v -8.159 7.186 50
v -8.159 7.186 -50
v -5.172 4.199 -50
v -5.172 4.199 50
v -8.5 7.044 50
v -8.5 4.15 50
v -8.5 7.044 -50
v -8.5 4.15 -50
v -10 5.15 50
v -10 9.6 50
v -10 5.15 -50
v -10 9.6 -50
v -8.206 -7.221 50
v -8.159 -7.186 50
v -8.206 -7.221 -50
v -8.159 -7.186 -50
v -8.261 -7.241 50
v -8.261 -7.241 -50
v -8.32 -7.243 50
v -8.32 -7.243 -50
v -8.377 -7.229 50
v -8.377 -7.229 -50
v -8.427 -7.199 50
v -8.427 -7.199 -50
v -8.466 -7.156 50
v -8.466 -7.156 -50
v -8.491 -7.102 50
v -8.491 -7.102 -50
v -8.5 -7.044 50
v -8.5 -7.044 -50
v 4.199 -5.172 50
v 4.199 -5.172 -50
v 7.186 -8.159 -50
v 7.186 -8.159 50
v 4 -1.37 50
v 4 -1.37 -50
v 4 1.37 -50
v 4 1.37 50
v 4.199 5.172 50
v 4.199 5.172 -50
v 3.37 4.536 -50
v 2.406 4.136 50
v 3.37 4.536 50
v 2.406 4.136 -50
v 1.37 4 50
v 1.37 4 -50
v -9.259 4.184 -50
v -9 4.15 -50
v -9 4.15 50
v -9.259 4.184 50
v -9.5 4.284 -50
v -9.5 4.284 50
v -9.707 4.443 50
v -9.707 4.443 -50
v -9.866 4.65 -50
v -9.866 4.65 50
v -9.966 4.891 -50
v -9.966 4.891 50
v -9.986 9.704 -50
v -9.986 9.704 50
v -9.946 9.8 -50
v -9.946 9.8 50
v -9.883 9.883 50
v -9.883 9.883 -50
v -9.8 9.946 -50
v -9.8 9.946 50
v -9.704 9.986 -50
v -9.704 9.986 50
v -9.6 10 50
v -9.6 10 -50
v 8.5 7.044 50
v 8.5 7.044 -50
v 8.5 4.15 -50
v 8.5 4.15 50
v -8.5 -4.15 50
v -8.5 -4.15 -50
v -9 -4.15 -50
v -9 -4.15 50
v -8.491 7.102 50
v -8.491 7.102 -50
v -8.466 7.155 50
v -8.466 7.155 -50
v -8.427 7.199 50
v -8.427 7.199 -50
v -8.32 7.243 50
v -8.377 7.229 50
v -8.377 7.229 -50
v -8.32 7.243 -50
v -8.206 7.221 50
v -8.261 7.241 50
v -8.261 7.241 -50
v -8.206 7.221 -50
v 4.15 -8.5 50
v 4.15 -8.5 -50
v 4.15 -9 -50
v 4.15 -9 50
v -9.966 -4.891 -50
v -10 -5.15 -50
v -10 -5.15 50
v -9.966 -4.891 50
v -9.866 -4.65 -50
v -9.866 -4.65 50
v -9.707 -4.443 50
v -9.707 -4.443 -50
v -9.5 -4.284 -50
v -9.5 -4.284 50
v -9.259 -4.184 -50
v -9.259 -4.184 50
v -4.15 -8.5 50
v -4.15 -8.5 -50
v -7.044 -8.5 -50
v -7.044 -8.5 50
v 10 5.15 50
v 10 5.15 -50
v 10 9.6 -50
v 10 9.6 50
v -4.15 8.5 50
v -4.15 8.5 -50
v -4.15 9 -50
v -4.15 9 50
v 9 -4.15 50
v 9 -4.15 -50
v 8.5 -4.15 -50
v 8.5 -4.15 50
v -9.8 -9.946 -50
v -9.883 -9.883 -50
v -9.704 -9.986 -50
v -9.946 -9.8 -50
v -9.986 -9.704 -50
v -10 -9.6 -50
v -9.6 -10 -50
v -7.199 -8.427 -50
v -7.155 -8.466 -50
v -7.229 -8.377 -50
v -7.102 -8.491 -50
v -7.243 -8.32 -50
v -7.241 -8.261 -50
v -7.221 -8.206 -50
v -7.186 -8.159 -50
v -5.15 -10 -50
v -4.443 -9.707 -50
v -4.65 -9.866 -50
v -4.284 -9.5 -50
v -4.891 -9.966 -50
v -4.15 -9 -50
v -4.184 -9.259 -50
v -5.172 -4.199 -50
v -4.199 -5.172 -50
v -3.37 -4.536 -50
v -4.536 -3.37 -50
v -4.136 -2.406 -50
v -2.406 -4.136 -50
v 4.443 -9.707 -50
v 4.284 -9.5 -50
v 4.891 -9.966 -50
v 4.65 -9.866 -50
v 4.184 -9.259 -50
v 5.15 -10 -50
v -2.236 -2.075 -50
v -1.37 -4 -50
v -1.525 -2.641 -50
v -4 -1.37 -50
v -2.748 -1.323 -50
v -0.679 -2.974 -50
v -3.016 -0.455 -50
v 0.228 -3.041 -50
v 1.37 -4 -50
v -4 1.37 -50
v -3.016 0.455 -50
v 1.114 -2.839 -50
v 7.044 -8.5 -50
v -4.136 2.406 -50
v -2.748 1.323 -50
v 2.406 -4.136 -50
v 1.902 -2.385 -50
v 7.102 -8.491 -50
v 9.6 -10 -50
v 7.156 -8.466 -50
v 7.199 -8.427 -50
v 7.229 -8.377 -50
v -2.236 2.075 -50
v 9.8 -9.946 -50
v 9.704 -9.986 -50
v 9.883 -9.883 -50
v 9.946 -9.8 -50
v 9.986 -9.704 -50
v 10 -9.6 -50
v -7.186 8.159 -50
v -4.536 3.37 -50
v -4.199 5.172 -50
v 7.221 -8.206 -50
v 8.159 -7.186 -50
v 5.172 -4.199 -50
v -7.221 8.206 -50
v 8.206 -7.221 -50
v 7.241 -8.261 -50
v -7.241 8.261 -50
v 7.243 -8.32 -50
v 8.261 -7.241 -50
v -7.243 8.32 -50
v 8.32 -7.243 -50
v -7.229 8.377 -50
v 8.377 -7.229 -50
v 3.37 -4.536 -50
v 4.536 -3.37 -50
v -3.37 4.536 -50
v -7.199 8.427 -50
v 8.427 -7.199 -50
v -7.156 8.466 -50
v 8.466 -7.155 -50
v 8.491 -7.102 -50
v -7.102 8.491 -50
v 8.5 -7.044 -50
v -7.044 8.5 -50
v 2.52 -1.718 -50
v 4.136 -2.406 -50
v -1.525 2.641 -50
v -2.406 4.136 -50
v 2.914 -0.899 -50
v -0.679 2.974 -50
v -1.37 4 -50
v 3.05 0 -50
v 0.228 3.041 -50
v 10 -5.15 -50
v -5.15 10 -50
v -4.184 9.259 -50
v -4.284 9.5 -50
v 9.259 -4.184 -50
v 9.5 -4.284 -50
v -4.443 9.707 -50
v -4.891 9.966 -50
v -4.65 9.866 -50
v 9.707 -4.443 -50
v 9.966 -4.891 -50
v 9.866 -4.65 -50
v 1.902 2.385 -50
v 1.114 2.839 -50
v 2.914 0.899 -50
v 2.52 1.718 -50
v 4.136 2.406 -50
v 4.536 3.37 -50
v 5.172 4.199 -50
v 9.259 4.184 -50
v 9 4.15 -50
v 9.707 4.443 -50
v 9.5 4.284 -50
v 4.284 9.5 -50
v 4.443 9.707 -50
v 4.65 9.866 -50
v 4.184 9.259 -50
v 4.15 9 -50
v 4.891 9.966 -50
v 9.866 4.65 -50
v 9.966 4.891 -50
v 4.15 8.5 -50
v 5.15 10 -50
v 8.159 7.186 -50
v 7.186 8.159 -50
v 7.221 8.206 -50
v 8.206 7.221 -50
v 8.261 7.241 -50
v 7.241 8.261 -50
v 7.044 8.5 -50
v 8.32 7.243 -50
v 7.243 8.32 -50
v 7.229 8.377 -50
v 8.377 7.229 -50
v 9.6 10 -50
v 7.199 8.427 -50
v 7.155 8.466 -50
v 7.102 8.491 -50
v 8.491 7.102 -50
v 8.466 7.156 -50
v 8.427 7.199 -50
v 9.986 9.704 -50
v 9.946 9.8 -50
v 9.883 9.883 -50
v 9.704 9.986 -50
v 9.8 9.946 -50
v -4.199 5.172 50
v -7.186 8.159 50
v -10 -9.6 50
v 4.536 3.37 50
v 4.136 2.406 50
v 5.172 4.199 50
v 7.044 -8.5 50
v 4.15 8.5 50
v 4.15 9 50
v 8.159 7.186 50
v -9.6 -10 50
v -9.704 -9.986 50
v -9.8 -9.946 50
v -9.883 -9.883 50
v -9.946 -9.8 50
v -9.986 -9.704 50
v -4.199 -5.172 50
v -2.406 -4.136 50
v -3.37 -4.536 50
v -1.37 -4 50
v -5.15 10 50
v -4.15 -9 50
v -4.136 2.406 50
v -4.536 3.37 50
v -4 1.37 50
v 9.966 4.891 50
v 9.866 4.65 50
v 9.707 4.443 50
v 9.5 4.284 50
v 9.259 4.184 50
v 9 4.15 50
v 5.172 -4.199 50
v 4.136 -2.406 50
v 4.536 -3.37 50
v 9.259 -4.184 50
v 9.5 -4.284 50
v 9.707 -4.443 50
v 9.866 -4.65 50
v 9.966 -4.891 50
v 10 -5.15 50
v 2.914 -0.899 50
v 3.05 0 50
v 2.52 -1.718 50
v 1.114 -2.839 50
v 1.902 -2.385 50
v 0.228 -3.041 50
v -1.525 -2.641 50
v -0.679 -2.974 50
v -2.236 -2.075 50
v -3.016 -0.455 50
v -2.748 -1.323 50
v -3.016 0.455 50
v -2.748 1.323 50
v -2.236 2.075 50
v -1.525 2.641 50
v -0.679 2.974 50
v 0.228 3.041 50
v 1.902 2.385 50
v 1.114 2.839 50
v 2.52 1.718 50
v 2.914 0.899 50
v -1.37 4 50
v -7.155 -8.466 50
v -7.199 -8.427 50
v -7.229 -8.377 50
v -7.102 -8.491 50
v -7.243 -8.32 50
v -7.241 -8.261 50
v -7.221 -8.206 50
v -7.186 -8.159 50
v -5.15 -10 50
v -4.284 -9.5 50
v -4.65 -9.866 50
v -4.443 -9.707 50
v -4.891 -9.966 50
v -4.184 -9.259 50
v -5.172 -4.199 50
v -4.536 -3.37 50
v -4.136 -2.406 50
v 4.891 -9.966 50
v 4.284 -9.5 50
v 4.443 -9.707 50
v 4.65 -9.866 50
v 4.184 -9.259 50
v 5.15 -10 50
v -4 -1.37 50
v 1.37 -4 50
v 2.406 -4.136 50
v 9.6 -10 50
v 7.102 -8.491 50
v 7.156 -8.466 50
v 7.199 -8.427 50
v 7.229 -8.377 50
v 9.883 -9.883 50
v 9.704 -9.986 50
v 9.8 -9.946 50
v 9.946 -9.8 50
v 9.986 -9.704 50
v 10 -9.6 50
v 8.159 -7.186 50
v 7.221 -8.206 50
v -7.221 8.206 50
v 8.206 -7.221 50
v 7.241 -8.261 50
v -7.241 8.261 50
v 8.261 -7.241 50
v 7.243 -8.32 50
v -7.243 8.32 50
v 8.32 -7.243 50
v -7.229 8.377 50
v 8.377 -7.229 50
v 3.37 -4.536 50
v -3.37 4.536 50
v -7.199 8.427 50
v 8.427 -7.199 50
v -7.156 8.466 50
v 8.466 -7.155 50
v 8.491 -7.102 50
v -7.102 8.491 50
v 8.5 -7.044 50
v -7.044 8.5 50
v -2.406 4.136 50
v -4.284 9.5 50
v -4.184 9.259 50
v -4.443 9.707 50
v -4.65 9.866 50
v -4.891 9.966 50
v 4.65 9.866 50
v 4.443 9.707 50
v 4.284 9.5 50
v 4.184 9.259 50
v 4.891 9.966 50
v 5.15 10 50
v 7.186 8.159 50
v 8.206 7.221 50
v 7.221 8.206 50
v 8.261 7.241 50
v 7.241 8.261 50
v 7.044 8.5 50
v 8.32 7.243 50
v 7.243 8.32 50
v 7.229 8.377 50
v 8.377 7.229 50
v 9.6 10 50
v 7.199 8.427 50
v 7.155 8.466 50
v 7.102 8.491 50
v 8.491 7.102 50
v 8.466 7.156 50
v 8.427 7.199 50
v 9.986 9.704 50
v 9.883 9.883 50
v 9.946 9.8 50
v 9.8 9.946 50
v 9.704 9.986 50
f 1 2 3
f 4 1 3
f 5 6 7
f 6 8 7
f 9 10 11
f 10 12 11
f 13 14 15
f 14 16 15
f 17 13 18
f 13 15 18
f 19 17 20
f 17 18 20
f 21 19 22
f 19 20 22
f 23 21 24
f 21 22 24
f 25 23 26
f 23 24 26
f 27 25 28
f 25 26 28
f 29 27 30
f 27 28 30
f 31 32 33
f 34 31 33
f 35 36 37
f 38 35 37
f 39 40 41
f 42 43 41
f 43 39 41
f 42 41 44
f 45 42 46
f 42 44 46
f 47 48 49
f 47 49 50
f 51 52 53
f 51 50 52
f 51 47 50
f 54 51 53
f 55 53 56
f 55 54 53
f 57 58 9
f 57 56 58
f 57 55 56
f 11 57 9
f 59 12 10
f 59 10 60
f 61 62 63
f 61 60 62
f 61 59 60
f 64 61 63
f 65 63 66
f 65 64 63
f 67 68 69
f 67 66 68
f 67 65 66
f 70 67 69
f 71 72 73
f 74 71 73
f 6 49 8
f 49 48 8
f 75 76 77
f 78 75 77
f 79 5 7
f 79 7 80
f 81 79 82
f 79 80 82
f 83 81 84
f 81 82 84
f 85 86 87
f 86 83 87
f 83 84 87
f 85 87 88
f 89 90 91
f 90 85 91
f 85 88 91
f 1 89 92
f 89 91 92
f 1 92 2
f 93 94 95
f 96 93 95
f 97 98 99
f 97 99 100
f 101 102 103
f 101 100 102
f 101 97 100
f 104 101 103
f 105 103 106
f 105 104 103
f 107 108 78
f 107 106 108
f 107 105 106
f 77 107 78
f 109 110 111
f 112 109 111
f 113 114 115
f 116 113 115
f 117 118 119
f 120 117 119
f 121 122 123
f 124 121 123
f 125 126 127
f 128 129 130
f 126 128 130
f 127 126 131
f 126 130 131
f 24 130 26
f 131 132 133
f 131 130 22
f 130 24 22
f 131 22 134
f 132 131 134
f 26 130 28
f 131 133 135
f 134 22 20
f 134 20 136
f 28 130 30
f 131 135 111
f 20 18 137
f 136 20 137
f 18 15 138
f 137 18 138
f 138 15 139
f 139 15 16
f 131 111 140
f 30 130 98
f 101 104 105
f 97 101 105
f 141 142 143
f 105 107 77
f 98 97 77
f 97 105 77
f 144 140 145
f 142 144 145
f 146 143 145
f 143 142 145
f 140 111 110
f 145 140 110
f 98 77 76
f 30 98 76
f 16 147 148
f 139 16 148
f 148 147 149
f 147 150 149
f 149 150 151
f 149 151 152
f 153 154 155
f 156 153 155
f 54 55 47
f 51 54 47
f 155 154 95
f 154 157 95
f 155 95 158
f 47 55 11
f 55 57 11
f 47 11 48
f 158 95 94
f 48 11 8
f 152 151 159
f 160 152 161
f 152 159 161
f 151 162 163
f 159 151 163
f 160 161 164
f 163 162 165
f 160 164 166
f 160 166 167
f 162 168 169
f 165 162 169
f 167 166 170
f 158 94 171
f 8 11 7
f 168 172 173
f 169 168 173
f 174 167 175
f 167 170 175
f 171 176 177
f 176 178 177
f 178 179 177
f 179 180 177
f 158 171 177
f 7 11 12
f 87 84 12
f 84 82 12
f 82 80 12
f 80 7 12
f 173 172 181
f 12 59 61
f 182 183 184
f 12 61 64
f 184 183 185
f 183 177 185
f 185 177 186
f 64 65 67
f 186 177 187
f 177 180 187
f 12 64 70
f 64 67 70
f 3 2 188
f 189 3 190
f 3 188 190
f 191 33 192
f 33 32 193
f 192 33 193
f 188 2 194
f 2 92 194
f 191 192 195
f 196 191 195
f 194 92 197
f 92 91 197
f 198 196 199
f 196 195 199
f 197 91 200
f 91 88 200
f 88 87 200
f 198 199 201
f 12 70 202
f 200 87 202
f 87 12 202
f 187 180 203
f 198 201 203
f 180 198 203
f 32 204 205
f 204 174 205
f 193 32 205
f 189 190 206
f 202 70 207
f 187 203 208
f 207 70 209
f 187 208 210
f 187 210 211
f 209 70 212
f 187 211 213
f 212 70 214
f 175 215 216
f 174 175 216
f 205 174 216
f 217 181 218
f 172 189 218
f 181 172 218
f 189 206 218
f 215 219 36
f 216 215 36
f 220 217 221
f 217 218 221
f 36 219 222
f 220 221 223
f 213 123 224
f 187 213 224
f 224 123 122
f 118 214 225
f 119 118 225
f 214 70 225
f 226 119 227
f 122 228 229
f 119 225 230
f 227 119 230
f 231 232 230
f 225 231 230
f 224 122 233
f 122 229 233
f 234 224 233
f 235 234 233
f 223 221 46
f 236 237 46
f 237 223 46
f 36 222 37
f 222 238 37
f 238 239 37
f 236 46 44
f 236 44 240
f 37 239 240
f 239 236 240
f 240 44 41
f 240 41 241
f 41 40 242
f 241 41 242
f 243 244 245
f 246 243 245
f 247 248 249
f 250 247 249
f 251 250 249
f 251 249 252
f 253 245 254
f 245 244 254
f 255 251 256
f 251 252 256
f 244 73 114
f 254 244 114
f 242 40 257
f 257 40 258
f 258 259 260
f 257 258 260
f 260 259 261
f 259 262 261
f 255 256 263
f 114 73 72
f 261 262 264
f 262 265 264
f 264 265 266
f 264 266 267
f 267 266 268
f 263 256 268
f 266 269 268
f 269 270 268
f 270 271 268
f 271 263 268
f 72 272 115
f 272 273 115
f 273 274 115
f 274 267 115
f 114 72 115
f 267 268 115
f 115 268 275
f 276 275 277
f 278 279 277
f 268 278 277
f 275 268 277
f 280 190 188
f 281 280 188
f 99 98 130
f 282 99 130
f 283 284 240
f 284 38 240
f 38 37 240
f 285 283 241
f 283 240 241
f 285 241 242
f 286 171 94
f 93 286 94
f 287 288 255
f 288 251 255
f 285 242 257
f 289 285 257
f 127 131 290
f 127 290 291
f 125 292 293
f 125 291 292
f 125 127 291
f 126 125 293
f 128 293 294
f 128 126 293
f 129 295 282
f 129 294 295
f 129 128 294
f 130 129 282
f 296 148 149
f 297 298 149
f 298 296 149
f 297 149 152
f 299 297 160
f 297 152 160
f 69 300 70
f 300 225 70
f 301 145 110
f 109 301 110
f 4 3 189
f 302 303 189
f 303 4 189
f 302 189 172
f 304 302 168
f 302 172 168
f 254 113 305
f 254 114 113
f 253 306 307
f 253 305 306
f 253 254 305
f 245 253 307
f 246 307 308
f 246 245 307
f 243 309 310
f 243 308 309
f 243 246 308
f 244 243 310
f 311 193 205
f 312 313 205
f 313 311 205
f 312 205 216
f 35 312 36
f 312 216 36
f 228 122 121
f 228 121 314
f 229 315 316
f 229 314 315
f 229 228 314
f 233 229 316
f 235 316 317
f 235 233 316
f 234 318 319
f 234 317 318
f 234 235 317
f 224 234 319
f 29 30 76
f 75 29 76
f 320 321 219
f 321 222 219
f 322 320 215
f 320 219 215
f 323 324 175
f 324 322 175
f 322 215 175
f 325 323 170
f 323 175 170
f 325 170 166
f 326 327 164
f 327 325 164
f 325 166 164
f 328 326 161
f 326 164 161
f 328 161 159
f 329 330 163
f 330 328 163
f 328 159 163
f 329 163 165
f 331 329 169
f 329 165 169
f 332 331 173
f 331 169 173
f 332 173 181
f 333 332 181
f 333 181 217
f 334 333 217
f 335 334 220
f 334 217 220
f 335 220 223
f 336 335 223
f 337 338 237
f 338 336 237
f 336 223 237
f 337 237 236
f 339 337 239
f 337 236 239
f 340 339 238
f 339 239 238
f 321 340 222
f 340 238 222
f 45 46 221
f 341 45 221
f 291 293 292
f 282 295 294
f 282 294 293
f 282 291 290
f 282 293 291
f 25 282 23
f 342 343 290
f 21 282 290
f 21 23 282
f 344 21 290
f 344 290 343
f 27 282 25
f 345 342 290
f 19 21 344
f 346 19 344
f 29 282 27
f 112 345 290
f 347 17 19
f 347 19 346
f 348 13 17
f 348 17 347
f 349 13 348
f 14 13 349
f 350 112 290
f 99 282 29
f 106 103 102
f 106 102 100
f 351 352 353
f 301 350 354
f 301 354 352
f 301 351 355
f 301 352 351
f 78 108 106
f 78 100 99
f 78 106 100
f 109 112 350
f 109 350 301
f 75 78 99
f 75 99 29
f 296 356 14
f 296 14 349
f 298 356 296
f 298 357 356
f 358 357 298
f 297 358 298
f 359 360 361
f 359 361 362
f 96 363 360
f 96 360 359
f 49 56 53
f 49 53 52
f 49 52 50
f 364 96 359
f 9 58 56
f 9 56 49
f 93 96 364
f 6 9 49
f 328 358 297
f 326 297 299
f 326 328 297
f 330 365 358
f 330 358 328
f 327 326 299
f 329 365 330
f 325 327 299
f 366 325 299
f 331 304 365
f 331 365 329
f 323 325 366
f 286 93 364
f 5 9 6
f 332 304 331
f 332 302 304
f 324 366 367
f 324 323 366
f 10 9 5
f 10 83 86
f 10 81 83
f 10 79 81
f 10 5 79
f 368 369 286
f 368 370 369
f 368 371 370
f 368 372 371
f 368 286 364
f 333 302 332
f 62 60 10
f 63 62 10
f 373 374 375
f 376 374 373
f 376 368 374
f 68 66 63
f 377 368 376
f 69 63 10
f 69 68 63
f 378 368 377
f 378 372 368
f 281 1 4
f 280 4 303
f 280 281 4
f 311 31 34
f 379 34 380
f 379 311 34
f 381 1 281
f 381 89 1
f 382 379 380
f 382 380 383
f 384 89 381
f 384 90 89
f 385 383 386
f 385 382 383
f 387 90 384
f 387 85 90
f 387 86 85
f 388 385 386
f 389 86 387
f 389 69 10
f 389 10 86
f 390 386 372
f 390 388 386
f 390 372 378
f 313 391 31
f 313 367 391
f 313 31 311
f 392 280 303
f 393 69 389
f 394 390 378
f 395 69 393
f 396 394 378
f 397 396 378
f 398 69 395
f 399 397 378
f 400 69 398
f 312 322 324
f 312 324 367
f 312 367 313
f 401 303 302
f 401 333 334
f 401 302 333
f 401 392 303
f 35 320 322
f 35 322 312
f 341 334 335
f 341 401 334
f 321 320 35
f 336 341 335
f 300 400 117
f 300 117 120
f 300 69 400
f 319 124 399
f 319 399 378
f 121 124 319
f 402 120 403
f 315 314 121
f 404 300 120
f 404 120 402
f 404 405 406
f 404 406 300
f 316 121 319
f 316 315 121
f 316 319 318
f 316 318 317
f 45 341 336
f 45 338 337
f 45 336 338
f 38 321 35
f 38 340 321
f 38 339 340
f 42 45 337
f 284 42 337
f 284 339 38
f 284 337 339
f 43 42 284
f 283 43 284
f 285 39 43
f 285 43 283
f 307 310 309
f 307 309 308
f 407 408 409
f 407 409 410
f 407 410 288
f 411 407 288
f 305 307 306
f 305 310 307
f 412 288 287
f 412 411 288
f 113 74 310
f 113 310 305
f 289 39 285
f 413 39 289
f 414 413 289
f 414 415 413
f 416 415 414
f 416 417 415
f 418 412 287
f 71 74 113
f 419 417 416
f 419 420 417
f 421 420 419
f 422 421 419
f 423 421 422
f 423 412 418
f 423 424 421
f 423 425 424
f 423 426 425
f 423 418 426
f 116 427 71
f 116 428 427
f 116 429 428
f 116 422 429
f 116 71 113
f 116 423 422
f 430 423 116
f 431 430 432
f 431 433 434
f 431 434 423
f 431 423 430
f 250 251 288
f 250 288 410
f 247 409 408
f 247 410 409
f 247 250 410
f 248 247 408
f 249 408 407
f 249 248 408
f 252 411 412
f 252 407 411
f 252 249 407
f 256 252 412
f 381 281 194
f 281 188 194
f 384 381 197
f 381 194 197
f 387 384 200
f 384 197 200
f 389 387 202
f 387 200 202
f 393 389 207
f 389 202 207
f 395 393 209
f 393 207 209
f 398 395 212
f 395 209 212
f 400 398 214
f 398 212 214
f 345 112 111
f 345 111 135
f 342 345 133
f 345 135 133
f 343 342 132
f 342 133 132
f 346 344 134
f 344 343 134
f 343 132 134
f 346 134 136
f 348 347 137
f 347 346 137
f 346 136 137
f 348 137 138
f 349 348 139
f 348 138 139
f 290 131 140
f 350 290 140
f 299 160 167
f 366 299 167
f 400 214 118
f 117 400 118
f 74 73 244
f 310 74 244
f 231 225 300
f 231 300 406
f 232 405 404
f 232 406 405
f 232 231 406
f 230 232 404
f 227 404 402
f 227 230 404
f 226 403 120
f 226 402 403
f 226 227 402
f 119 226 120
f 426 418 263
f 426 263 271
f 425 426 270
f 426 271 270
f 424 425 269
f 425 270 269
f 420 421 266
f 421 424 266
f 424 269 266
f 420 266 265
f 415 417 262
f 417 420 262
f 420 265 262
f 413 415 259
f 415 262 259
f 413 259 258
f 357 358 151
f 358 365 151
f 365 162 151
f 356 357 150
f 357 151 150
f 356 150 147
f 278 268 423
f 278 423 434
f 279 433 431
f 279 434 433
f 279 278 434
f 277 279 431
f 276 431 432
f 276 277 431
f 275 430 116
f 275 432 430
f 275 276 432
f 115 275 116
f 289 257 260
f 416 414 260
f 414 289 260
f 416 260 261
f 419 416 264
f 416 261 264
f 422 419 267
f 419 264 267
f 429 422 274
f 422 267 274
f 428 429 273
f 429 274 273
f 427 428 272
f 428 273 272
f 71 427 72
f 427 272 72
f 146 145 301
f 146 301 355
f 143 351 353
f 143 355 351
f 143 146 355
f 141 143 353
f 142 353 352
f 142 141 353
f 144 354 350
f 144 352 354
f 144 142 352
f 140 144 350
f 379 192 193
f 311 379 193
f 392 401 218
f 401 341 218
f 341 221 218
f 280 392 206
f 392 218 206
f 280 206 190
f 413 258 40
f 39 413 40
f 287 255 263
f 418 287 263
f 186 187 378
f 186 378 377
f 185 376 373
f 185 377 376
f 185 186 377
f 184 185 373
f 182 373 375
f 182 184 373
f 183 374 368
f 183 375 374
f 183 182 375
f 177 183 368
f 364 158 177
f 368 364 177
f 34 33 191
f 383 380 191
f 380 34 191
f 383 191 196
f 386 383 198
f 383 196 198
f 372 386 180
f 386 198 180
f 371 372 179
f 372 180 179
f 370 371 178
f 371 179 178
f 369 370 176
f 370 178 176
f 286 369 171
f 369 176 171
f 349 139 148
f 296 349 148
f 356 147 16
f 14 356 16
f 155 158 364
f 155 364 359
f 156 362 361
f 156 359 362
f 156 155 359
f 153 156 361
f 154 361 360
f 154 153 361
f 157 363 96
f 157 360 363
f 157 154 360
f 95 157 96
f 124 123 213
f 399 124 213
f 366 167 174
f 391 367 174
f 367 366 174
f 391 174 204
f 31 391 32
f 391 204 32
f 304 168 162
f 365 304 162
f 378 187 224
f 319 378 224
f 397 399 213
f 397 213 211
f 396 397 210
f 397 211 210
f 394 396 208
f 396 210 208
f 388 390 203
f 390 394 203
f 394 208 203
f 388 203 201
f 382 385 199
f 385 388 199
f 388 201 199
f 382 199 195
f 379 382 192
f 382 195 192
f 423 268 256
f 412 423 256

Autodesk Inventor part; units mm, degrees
ref_plane "YZ Plane" through (0, 0, 0) normal (1, 0, 0) x (0, 1, 0)
ref_plane "XZ Plane" through (0, 0, 0) normal (0, 1, 0) x (-1, 0, 0)
ref_plane "XY Plane" through (0, 0, 0) normal (0, 0, 1) x (1, 0, 0)
sketch "Sketch1" plane through (0, 0, 0) normal (0, 0, 1) x (1, 0, 0)
  line L0 (-4.1988, 5.1716) -> (-7.1858, 8.1586)
  arc A0 (-7.0444, 8.5) -> (-7.1858, 8.1586) centre (-7.0444, 8.3) ccw
  line L1 (-7.0444, 8.5) -> (-4.15, 8.5)
  line L2 (-4.15, 8.5) -> (-4.15, 9)
  arc A1 (-4.15, 9) -> (-5.15, 10) centre (-5.15, 9) ccw
  line L3 (-5.15, 10) -> (-9.6, 10)
  arc A2 (-9.6, 10) -> (-10, 9.6) centre (-9.6, 9.6) ccw
  line L4 (-10, 9.6) -> (-10, 5.15)
  arc A3 (-10, 5.15) -> (-9, 4.15) centre (-9, 5.15) ccw
  line L5 (-9, 4.15) -> (-8.5, 4.15)
  line L6 (-8.5, 4.15) -> (-8.5, 7.0444)
  arc A4 (-8.1586, 7.1858) -> (-8.5, 7.0444) centre (-8.3, 7.0444) ccw
  line L7 (-8.1586, 7.1858) -> (-5.1716, 4.1988)
  arc A5 (-4, 1.3704) -> (-5.1716, 4.1988) centre (-8, 1.3704) ccw
  line L8 (-4, 1.3704) -> (-4, 0)
  line L9 (-4, 0) -> (-4, -1.3704)
  arc A6 (-5.1716, -4.1988) -> (-4, -1.3704) centre (-8, -1.3704) ccw
  line L10 (-5.1716, -4.1988) -> (-8.1586, -7.1858)
  arc A7 (-8.5, -7.0444) -> (-8.1586, -7.1858) centre (-8.3, -7.0444) ccw
  line L11 (-8.5, -7.0444) -> (-8.5, -4.15)
  line L12 (-8.5, -4.15) -> (-9, -4.15)
  arc A8 (-9, -4.15) -> (-10, -5.15) centre (-9, -5.15) ccw
  line L13 (-10, -5.15) -> (-10, -9.6)
  arc A9 (-10, -9.6) -> (-9.6, -10) centre (-9.6, -9.6) ccw
  line L14 (-9.6, -10) -> (-5.15, -10)
  arc A10 (-5.15, -10) -> (-4.15, -9) centre (-5.15, -9) ccw
  line L15 (-4.15, -9) -> (-4.15, -8.5)
  line L16 (-4.15, -8.5) -> (-7.0444, -8.5)
  arc A11 (-7.1858, -8.1586) -> (-7.0444, -8.5) centre (-7.0444, -8.3) ccw
  line L17 (-7.1858, -8.1586) -> (-4.1988, -5.1716)
  arc A12 (-1.3704, -4) -> (-4.1988, -5.1716) centre (-1.3704, -8) ccw
  line L18 (-1.3704, -4) -> (0, -4)
  line L19 (0, -4) -> (1.3704, -4)
  arc A13 (4.1988, -5.1716) -> (1.3704, -4) centre (1.3704, -8) ccw
  line L20 (4.1988, -5.1716) -> (7.1858, -8.1586)
  arc A14 (7.0444, -8.5) -> (7.1858, -8.1586) centre (7.0444, -8.3) ccw
  line L21 (7.0444, -8.5) -> (4.15, -8.5)
  line L22 (4.15, -8.5) -> (4.15, -9)
  arc A15 (4.15, -9) -> (5.15, -10) centre (5.15, -9) ccw
  line L23 (5.15, -10) -> (9.6, -10)
  arc A16 (9.6, -10) -> (10, -9.6) centre (9.6, -9.6) ccw
  line L24 (10, -9.6) -> (10, -5.15)
  arc A17 (10, -5.15) -> (9, -4.15) centre (9, -5.15) ccw
  line L25 (9, -4.15) -> (8.5, -4.15)
  line L26 (8.5, -4.15) -> (8.5, -7.0444)
  arc A18 (8.1586, -7.1858) -> (8.5, -7.0444) centre (8.3, -7.0444) ccw
  line L27 (8.1586, -7.1858) -> (5.1716, -4.1988)
  arc A19 (4, -1.3704) -> (5.1716, -4.1988) centre (8, -1.3704) ccw
  line L28 (4, -1.3704) -> (4, 0)
  line L29 (4, 0) -> (4, 1.3704)
  arc A20 (5.1716, 4.1988) -> (4, 1.3704) centre (8, 1.3704) ccw
  line L30 (5.1716, 4.1988) -> (8.1586, 7.1858)
  arc A21 (8.5, 7.0444) -> (8.1586, 7.1858) centre (8.3, 7.0444) ccw
  line L31 (8.5, 7.0444) -> (8.5, 4.15)
  line L32 (8.5, 4.15) -> (9, 4.15)
  arc A22 (9, 4.15) -> (10, 5.15) centre (9, 5.15) ccw
  line L33 (10, 5.15) -> (10, 9.6)
  arc A23 (10, 9.6) -> (9.6, 10) centre (9.6, 9.6) ccw
  line L34 (9.6, 10) -> (5.15, 10)
  arc A24 (5.15, 10) -> (4.15, 9) centre (5.15, 9) ccw
  line L35 (4.15, 9) -> (4.15, 8.5)
  line L36 (4.15, 8.5) -> (7.0444, 8.5)
  arc A25 (7.1858, 8.1586) -> (7.0444, 8.5) centre (7.0444, 8.3) ccw
  line L37 (7.1858, 8.1586) -> (4.1988, 5.1716)
  arc A26 (1.3704, 4) -> (4.1988, 5.1716) centre (1.3704, 8) ccw
  line L38 (1.3704, 4) -> (0, 4)
  line L39 (0, 4) -> (-1.3704, 4)
  arc A27 (-4.1988, 5.1716) -> (-1.3704, 4) centre (-1.3704, 8) ccw
  circle A28 centre (0, 0) radius 3.05
extrude "Extrusion1" add sketch "Sketch1" along normal mid plane 100
properties part number "Perfil 20 x 20 Básico - LEGP20101" material "Aluminum 6061"
